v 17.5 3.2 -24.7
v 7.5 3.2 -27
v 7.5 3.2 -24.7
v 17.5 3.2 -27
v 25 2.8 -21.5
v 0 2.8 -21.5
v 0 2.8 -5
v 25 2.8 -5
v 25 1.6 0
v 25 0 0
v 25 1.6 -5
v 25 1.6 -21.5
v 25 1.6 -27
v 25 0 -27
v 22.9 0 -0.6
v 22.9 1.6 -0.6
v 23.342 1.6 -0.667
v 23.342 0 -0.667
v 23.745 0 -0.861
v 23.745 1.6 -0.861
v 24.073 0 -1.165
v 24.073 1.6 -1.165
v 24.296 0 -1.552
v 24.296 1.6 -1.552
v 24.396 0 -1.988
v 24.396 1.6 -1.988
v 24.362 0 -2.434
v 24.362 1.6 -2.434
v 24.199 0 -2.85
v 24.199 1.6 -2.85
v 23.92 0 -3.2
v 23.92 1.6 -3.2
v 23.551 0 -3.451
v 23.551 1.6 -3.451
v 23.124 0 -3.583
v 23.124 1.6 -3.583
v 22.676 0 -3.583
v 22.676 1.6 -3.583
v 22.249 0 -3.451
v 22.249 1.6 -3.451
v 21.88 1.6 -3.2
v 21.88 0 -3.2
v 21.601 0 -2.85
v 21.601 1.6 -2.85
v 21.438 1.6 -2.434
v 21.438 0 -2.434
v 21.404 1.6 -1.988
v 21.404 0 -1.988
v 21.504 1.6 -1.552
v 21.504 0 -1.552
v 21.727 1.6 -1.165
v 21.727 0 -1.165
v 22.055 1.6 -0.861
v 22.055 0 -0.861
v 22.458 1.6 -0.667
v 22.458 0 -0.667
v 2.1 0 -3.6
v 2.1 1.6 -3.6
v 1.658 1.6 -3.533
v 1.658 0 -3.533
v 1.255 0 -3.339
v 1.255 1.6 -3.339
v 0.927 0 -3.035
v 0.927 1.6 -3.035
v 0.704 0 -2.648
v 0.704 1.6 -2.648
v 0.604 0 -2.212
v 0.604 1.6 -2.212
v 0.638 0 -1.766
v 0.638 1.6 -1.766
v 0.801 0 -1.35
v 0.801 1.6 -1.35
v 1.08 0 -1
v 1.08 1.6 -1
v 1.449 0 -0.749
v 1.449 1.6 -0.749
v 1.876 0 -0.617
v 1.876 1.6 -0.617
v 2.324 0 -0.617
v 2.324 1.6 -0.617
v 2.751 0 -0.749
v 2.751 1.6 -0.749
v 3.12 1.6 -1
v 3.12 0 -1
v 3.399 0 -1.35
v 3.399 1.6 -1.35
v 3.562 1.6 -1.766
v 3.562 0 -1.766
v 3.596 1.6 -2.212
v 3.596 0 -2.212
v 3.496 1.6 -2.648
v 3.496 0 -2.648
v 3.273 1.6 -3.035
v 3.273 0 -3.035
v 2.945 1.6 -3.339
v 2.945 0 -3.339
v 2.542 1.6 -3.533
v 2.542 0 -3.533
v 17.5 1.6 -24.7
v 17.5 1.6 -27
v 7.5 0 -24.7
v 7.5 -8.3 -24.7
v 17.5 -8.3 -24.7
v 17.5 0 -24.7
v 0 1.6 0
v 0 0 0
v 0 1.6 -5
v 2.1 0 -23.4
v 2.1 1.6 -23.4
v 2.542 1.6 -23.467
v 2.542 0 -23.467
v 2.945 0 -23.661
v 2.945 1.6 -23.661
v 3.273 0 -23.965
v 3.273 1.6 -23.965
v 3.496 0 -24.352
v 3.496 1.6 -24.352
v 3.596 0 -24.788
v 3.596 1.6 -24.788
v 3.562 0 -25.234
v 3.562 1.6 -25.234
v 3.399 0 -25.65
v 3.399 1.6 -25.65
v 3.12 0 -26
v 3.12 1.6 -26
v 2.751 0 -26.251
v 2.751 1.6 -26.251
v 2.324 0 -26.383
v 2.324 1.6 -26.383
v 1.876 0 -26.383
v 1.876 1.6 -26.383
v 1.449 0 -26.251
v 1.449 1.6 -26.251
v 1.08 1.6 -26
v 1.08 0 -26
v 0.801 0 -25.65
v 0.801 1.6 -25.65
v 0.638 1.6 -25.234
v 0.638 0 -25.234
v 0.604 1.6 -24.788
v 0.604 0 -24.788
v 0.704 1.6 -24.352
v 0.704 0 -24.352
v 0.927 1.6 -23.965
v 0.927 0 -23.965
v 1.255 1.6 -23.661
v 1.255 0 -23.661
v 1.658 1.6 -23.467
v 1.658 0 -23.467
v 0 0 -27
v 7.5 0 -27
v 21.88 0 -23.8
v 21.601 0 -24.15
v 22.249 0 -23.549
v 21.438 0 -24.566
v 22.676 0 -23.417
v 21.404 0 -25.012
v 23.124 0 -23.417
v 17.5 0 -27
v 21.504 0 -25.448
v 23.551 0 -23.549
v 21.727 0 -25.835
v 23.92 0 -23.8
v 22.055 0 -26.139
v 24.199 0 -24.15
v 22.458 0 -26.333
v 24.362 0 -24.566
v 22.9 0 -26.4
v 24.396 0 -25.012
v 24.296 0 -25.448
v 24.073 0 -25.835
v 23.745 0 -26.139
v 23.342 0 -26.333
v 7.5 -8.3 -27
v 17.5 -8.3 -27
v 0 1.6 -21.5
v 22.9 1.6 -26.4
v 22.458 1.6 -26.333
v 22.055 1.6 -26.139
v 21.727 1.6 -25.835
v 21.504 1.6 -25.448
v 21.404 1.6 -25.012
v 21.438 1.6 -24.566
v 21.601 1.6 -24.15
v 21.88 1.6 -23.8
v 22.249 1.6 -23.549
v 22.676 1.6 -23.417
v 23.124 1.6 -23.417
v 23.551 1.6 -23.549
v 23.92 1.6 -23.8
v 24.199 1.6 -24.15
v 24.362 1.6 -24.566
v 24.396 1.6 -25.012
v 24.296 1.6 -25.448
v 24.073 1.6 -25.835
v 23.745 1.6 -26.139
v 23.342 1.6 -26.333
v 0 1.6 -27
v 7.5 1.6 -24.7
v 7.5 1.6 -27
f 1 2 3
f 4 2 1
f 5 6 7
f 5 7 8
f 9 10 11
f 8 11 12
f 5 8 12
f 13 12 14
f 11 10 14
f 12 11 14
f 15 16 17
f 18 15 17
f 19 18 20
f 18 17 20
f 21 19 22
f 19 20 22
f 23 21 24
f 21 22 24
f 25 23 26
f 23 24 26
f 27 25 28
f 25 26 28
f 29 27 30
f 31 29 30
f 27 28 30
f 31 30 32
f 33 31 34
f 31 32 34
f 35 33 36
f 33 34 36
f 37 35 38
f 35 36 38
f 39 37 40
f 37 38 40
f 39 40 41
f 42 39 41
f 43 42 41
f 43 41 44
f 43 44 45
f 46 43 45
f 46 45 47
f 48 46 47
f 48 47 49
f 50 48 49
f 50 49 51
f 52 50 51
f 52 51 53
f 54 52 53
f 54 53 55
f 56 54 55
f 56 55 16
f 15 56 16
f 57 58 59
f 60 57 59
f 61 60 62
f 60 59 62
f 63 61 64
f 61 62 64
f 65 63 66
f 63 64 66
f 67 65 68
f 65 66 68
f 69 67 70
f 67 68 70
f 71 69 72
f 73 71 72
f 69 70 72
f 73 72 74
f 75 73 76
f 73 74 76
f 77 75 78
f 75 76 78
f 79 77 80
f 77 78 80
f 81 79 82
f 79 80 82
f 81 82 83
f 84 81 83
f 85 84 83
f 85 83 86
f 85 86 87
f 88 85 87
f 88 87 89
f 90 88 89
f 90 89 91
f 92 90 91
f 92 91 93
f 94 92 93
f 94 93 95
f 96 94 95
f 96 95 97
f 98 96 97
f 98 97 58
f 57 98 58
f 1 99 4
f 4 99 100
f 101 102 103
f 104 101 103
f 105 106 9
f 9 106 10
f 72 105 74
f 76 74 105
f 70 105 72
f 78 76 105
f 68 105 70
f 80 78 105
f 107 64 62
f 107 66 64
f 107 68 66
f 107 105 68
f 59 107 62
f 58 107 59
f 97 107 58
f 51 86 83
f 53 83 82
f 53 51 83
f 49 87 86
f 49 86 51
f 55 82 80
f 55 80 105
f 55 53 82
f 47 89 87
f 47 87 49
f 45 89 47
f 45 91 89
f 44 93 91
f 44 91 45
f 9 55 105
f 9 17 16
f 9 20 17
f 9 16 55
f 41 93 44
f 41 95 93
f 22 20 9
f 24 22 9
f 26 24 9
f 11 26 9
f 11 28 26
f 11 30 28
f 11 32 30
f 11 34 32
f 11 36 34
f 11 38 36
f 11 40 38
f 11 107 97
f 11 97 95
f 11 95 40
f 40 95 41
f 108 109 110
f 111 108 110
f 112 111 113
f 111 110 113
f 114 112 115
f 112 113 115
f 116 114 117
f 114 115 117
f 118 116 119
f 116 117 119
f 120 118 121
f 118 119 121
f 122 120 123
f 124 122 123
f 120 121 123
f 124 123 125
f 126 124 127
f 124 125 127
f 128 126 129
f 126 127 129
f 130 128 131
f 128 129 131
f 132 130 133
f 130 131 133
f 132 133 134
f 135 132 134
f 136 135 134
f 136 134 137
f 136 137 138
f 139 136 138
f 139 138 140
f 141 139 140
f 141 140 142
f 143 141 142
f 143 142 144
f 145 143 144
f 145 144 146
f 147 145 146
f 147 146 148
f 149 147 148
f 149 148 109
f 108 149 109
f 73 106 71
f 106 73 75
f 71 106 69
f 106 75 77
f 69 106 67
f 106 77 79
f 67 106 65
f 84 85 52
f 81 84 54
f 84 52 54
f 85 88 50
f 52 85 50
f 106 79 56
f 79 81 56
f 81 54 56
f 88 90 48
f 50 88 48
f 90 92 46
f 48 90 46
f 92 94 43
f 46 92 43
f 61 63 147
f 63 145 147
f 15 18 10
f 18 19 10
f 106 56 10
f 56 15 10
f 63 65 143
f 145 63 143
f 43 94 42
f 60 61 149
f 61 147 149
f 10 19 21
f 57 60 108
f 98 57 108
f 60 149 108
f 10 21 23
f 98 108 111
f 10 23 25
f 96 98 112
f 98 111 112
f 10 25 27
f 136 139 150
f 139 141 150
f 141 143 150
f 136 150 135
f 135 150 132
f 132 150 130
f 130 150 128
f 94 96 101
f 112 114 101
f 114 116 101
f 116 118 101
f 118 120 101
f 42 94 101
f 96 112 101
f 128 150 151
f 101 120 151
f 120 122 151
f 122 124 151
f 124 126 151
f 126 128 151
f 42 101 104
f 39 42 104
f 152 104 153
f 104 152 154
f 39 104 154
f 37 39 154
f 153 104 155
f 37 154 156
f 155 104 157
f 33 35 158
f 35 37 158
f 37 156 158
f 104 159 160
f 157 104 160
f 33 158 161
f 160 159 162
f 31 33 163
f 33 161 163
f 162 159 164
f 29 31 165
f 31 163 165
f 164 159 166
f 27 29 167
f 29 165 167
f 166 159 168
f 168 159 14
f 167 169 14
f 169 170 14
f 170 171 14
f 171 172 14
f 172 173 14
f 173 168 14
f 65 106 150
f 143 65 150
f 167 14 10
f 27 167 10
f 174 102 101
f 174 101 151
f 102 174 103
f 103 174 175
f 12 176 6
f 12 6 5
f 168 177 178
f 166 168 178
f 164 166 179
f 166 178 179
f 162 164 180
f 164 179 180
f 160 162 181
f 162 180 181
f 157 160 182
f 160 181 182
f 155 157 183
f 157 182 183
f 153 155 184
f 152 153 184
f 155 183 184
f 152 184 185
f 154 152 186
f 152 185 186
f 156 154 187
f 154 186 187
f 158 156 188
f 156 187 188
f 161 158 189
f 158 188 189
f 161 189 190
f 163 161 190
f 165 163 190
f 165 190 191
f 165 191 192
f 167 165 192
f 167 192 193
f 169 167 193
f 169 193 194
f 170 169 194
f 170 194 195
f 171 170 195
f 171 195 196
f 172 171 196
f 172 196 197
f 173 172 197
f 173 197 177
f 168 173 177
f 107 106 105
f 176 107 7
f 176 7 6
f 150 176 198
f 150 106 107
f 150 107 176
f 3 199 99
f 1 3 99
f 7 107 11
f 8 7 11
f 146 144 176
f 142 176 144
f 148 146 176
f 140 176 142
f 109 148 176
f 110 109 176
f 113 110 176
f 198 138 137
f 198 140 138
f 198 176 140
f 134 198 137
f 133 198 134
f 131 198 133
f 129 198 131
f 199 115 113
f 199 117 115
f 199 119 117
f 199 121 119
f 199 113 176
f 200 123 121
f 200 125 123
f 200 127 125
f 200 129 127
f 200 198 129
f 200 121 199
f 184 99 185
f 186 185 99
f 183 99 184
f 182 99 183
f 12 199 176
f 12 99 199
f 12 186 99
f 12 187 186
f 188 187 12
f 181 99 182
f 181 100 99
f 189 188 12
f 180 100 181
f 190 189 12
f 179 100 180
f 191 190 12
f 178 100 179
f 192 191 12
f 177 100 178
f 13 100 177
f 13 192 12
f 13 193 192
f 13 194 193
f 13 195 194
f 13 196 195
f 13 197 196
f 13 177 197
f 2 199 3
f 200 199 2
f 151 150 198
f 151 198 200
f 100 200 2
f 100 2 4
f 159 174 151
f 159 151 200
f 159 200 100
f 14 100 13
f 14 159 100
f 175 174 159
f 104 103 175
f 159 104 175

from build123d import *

# Parameters (mm, degrees)
SKETCH_1_W           = 25
SKETCH_1_H           = 27
EXTRUDE_1_DEPTH      = 1.6
SKETCH_2_W           = 25
SKETCH_2_H           = 16.5
EXTRUDE_2_DEPTH      = 1.2
SKETCH_3_R           = 1.5
CUT_EXTRUDE_1_DEPTH  = 37.83150825
EXTRUDE_4_DEPTH      = 1.6
EXTRUDE_4_DEPTH_BACK = 9.9
SKETCH_5_W           = 10
SKETCH_5_H           = 2.3


with BuildPart() as part:
    # 草图1 → 凸台-拉伸1 (new body)
    with BuildSketch(Plane(origin=(0, 0, 0), x_dir=(1, 0, 0), z_dir=(0, 1, 0))):
        with Locations((12.5, 13.5)):
            Rectangle(SKETCH_1_W, SKETCH_1_H)
    extrude(amount=EXTRUDE_1_DEPTH)

    # 草图2 → 凸台-拉伸2 (add)
    with BuildSketch(Plane(origin=(0, 1.6, 0), x_dir=(1, 0, 0), z_dir=(0, 1, 0))):
        with Locations((12.5, 13.25)):
            Rectangle(SKETCH_2_W, SKETCH_2_H)
    extrude(amount=EXTRUDE_2_DEPTH)

    # 草图3 → 切除-拉伸1 (cut, through all)
    with BuildSketch(Plane(origin=(0, 1.6, 0), x_dir=(1, 0, 0), z_dir=(0, 1, 0))):
        with Locations(Location((2.1, 24.9, 0), (0, 0, 270))):
            Circle(SKETCH_3_R)
        with Locations(Location((22.9, 24.9, 0), (0, 0, 90))):
            Circle(SKETCH_3_R)
        with Locations(Location((22.9, 2.1, 0), (0, 0, 270))):
            Circle(SKETCH_3_R)
        with Locations(Location((2.1, 2.1, 0), (0, 0, 90))):
            Circle(SKETCH_3_R)
    extrude(amount=-CUT_EXTRUDE_1_DEPTH, mode=Mode.SUBTRACT)

    # 草图5 → 凸台-拉伸4 (add, two sides: drawn at the far end of the back side and taken through both)
    with BuildSketch(Plane(origin=(0, 1.6, 0), x_dir=(1, 0, 0), z_dir=(0, 1, 0)).offset(-EXTRUDE_4_DEPTH_BACK)):
        with Locations((12.5, 25.85)):
            Rectangle(SKETCH_5_W, SKETCH_5_H)
    extrude(amount=EXTRUDE_4_DEPTH + EXTRUDE_4_DEPTH_BACK)


solid = part.part
